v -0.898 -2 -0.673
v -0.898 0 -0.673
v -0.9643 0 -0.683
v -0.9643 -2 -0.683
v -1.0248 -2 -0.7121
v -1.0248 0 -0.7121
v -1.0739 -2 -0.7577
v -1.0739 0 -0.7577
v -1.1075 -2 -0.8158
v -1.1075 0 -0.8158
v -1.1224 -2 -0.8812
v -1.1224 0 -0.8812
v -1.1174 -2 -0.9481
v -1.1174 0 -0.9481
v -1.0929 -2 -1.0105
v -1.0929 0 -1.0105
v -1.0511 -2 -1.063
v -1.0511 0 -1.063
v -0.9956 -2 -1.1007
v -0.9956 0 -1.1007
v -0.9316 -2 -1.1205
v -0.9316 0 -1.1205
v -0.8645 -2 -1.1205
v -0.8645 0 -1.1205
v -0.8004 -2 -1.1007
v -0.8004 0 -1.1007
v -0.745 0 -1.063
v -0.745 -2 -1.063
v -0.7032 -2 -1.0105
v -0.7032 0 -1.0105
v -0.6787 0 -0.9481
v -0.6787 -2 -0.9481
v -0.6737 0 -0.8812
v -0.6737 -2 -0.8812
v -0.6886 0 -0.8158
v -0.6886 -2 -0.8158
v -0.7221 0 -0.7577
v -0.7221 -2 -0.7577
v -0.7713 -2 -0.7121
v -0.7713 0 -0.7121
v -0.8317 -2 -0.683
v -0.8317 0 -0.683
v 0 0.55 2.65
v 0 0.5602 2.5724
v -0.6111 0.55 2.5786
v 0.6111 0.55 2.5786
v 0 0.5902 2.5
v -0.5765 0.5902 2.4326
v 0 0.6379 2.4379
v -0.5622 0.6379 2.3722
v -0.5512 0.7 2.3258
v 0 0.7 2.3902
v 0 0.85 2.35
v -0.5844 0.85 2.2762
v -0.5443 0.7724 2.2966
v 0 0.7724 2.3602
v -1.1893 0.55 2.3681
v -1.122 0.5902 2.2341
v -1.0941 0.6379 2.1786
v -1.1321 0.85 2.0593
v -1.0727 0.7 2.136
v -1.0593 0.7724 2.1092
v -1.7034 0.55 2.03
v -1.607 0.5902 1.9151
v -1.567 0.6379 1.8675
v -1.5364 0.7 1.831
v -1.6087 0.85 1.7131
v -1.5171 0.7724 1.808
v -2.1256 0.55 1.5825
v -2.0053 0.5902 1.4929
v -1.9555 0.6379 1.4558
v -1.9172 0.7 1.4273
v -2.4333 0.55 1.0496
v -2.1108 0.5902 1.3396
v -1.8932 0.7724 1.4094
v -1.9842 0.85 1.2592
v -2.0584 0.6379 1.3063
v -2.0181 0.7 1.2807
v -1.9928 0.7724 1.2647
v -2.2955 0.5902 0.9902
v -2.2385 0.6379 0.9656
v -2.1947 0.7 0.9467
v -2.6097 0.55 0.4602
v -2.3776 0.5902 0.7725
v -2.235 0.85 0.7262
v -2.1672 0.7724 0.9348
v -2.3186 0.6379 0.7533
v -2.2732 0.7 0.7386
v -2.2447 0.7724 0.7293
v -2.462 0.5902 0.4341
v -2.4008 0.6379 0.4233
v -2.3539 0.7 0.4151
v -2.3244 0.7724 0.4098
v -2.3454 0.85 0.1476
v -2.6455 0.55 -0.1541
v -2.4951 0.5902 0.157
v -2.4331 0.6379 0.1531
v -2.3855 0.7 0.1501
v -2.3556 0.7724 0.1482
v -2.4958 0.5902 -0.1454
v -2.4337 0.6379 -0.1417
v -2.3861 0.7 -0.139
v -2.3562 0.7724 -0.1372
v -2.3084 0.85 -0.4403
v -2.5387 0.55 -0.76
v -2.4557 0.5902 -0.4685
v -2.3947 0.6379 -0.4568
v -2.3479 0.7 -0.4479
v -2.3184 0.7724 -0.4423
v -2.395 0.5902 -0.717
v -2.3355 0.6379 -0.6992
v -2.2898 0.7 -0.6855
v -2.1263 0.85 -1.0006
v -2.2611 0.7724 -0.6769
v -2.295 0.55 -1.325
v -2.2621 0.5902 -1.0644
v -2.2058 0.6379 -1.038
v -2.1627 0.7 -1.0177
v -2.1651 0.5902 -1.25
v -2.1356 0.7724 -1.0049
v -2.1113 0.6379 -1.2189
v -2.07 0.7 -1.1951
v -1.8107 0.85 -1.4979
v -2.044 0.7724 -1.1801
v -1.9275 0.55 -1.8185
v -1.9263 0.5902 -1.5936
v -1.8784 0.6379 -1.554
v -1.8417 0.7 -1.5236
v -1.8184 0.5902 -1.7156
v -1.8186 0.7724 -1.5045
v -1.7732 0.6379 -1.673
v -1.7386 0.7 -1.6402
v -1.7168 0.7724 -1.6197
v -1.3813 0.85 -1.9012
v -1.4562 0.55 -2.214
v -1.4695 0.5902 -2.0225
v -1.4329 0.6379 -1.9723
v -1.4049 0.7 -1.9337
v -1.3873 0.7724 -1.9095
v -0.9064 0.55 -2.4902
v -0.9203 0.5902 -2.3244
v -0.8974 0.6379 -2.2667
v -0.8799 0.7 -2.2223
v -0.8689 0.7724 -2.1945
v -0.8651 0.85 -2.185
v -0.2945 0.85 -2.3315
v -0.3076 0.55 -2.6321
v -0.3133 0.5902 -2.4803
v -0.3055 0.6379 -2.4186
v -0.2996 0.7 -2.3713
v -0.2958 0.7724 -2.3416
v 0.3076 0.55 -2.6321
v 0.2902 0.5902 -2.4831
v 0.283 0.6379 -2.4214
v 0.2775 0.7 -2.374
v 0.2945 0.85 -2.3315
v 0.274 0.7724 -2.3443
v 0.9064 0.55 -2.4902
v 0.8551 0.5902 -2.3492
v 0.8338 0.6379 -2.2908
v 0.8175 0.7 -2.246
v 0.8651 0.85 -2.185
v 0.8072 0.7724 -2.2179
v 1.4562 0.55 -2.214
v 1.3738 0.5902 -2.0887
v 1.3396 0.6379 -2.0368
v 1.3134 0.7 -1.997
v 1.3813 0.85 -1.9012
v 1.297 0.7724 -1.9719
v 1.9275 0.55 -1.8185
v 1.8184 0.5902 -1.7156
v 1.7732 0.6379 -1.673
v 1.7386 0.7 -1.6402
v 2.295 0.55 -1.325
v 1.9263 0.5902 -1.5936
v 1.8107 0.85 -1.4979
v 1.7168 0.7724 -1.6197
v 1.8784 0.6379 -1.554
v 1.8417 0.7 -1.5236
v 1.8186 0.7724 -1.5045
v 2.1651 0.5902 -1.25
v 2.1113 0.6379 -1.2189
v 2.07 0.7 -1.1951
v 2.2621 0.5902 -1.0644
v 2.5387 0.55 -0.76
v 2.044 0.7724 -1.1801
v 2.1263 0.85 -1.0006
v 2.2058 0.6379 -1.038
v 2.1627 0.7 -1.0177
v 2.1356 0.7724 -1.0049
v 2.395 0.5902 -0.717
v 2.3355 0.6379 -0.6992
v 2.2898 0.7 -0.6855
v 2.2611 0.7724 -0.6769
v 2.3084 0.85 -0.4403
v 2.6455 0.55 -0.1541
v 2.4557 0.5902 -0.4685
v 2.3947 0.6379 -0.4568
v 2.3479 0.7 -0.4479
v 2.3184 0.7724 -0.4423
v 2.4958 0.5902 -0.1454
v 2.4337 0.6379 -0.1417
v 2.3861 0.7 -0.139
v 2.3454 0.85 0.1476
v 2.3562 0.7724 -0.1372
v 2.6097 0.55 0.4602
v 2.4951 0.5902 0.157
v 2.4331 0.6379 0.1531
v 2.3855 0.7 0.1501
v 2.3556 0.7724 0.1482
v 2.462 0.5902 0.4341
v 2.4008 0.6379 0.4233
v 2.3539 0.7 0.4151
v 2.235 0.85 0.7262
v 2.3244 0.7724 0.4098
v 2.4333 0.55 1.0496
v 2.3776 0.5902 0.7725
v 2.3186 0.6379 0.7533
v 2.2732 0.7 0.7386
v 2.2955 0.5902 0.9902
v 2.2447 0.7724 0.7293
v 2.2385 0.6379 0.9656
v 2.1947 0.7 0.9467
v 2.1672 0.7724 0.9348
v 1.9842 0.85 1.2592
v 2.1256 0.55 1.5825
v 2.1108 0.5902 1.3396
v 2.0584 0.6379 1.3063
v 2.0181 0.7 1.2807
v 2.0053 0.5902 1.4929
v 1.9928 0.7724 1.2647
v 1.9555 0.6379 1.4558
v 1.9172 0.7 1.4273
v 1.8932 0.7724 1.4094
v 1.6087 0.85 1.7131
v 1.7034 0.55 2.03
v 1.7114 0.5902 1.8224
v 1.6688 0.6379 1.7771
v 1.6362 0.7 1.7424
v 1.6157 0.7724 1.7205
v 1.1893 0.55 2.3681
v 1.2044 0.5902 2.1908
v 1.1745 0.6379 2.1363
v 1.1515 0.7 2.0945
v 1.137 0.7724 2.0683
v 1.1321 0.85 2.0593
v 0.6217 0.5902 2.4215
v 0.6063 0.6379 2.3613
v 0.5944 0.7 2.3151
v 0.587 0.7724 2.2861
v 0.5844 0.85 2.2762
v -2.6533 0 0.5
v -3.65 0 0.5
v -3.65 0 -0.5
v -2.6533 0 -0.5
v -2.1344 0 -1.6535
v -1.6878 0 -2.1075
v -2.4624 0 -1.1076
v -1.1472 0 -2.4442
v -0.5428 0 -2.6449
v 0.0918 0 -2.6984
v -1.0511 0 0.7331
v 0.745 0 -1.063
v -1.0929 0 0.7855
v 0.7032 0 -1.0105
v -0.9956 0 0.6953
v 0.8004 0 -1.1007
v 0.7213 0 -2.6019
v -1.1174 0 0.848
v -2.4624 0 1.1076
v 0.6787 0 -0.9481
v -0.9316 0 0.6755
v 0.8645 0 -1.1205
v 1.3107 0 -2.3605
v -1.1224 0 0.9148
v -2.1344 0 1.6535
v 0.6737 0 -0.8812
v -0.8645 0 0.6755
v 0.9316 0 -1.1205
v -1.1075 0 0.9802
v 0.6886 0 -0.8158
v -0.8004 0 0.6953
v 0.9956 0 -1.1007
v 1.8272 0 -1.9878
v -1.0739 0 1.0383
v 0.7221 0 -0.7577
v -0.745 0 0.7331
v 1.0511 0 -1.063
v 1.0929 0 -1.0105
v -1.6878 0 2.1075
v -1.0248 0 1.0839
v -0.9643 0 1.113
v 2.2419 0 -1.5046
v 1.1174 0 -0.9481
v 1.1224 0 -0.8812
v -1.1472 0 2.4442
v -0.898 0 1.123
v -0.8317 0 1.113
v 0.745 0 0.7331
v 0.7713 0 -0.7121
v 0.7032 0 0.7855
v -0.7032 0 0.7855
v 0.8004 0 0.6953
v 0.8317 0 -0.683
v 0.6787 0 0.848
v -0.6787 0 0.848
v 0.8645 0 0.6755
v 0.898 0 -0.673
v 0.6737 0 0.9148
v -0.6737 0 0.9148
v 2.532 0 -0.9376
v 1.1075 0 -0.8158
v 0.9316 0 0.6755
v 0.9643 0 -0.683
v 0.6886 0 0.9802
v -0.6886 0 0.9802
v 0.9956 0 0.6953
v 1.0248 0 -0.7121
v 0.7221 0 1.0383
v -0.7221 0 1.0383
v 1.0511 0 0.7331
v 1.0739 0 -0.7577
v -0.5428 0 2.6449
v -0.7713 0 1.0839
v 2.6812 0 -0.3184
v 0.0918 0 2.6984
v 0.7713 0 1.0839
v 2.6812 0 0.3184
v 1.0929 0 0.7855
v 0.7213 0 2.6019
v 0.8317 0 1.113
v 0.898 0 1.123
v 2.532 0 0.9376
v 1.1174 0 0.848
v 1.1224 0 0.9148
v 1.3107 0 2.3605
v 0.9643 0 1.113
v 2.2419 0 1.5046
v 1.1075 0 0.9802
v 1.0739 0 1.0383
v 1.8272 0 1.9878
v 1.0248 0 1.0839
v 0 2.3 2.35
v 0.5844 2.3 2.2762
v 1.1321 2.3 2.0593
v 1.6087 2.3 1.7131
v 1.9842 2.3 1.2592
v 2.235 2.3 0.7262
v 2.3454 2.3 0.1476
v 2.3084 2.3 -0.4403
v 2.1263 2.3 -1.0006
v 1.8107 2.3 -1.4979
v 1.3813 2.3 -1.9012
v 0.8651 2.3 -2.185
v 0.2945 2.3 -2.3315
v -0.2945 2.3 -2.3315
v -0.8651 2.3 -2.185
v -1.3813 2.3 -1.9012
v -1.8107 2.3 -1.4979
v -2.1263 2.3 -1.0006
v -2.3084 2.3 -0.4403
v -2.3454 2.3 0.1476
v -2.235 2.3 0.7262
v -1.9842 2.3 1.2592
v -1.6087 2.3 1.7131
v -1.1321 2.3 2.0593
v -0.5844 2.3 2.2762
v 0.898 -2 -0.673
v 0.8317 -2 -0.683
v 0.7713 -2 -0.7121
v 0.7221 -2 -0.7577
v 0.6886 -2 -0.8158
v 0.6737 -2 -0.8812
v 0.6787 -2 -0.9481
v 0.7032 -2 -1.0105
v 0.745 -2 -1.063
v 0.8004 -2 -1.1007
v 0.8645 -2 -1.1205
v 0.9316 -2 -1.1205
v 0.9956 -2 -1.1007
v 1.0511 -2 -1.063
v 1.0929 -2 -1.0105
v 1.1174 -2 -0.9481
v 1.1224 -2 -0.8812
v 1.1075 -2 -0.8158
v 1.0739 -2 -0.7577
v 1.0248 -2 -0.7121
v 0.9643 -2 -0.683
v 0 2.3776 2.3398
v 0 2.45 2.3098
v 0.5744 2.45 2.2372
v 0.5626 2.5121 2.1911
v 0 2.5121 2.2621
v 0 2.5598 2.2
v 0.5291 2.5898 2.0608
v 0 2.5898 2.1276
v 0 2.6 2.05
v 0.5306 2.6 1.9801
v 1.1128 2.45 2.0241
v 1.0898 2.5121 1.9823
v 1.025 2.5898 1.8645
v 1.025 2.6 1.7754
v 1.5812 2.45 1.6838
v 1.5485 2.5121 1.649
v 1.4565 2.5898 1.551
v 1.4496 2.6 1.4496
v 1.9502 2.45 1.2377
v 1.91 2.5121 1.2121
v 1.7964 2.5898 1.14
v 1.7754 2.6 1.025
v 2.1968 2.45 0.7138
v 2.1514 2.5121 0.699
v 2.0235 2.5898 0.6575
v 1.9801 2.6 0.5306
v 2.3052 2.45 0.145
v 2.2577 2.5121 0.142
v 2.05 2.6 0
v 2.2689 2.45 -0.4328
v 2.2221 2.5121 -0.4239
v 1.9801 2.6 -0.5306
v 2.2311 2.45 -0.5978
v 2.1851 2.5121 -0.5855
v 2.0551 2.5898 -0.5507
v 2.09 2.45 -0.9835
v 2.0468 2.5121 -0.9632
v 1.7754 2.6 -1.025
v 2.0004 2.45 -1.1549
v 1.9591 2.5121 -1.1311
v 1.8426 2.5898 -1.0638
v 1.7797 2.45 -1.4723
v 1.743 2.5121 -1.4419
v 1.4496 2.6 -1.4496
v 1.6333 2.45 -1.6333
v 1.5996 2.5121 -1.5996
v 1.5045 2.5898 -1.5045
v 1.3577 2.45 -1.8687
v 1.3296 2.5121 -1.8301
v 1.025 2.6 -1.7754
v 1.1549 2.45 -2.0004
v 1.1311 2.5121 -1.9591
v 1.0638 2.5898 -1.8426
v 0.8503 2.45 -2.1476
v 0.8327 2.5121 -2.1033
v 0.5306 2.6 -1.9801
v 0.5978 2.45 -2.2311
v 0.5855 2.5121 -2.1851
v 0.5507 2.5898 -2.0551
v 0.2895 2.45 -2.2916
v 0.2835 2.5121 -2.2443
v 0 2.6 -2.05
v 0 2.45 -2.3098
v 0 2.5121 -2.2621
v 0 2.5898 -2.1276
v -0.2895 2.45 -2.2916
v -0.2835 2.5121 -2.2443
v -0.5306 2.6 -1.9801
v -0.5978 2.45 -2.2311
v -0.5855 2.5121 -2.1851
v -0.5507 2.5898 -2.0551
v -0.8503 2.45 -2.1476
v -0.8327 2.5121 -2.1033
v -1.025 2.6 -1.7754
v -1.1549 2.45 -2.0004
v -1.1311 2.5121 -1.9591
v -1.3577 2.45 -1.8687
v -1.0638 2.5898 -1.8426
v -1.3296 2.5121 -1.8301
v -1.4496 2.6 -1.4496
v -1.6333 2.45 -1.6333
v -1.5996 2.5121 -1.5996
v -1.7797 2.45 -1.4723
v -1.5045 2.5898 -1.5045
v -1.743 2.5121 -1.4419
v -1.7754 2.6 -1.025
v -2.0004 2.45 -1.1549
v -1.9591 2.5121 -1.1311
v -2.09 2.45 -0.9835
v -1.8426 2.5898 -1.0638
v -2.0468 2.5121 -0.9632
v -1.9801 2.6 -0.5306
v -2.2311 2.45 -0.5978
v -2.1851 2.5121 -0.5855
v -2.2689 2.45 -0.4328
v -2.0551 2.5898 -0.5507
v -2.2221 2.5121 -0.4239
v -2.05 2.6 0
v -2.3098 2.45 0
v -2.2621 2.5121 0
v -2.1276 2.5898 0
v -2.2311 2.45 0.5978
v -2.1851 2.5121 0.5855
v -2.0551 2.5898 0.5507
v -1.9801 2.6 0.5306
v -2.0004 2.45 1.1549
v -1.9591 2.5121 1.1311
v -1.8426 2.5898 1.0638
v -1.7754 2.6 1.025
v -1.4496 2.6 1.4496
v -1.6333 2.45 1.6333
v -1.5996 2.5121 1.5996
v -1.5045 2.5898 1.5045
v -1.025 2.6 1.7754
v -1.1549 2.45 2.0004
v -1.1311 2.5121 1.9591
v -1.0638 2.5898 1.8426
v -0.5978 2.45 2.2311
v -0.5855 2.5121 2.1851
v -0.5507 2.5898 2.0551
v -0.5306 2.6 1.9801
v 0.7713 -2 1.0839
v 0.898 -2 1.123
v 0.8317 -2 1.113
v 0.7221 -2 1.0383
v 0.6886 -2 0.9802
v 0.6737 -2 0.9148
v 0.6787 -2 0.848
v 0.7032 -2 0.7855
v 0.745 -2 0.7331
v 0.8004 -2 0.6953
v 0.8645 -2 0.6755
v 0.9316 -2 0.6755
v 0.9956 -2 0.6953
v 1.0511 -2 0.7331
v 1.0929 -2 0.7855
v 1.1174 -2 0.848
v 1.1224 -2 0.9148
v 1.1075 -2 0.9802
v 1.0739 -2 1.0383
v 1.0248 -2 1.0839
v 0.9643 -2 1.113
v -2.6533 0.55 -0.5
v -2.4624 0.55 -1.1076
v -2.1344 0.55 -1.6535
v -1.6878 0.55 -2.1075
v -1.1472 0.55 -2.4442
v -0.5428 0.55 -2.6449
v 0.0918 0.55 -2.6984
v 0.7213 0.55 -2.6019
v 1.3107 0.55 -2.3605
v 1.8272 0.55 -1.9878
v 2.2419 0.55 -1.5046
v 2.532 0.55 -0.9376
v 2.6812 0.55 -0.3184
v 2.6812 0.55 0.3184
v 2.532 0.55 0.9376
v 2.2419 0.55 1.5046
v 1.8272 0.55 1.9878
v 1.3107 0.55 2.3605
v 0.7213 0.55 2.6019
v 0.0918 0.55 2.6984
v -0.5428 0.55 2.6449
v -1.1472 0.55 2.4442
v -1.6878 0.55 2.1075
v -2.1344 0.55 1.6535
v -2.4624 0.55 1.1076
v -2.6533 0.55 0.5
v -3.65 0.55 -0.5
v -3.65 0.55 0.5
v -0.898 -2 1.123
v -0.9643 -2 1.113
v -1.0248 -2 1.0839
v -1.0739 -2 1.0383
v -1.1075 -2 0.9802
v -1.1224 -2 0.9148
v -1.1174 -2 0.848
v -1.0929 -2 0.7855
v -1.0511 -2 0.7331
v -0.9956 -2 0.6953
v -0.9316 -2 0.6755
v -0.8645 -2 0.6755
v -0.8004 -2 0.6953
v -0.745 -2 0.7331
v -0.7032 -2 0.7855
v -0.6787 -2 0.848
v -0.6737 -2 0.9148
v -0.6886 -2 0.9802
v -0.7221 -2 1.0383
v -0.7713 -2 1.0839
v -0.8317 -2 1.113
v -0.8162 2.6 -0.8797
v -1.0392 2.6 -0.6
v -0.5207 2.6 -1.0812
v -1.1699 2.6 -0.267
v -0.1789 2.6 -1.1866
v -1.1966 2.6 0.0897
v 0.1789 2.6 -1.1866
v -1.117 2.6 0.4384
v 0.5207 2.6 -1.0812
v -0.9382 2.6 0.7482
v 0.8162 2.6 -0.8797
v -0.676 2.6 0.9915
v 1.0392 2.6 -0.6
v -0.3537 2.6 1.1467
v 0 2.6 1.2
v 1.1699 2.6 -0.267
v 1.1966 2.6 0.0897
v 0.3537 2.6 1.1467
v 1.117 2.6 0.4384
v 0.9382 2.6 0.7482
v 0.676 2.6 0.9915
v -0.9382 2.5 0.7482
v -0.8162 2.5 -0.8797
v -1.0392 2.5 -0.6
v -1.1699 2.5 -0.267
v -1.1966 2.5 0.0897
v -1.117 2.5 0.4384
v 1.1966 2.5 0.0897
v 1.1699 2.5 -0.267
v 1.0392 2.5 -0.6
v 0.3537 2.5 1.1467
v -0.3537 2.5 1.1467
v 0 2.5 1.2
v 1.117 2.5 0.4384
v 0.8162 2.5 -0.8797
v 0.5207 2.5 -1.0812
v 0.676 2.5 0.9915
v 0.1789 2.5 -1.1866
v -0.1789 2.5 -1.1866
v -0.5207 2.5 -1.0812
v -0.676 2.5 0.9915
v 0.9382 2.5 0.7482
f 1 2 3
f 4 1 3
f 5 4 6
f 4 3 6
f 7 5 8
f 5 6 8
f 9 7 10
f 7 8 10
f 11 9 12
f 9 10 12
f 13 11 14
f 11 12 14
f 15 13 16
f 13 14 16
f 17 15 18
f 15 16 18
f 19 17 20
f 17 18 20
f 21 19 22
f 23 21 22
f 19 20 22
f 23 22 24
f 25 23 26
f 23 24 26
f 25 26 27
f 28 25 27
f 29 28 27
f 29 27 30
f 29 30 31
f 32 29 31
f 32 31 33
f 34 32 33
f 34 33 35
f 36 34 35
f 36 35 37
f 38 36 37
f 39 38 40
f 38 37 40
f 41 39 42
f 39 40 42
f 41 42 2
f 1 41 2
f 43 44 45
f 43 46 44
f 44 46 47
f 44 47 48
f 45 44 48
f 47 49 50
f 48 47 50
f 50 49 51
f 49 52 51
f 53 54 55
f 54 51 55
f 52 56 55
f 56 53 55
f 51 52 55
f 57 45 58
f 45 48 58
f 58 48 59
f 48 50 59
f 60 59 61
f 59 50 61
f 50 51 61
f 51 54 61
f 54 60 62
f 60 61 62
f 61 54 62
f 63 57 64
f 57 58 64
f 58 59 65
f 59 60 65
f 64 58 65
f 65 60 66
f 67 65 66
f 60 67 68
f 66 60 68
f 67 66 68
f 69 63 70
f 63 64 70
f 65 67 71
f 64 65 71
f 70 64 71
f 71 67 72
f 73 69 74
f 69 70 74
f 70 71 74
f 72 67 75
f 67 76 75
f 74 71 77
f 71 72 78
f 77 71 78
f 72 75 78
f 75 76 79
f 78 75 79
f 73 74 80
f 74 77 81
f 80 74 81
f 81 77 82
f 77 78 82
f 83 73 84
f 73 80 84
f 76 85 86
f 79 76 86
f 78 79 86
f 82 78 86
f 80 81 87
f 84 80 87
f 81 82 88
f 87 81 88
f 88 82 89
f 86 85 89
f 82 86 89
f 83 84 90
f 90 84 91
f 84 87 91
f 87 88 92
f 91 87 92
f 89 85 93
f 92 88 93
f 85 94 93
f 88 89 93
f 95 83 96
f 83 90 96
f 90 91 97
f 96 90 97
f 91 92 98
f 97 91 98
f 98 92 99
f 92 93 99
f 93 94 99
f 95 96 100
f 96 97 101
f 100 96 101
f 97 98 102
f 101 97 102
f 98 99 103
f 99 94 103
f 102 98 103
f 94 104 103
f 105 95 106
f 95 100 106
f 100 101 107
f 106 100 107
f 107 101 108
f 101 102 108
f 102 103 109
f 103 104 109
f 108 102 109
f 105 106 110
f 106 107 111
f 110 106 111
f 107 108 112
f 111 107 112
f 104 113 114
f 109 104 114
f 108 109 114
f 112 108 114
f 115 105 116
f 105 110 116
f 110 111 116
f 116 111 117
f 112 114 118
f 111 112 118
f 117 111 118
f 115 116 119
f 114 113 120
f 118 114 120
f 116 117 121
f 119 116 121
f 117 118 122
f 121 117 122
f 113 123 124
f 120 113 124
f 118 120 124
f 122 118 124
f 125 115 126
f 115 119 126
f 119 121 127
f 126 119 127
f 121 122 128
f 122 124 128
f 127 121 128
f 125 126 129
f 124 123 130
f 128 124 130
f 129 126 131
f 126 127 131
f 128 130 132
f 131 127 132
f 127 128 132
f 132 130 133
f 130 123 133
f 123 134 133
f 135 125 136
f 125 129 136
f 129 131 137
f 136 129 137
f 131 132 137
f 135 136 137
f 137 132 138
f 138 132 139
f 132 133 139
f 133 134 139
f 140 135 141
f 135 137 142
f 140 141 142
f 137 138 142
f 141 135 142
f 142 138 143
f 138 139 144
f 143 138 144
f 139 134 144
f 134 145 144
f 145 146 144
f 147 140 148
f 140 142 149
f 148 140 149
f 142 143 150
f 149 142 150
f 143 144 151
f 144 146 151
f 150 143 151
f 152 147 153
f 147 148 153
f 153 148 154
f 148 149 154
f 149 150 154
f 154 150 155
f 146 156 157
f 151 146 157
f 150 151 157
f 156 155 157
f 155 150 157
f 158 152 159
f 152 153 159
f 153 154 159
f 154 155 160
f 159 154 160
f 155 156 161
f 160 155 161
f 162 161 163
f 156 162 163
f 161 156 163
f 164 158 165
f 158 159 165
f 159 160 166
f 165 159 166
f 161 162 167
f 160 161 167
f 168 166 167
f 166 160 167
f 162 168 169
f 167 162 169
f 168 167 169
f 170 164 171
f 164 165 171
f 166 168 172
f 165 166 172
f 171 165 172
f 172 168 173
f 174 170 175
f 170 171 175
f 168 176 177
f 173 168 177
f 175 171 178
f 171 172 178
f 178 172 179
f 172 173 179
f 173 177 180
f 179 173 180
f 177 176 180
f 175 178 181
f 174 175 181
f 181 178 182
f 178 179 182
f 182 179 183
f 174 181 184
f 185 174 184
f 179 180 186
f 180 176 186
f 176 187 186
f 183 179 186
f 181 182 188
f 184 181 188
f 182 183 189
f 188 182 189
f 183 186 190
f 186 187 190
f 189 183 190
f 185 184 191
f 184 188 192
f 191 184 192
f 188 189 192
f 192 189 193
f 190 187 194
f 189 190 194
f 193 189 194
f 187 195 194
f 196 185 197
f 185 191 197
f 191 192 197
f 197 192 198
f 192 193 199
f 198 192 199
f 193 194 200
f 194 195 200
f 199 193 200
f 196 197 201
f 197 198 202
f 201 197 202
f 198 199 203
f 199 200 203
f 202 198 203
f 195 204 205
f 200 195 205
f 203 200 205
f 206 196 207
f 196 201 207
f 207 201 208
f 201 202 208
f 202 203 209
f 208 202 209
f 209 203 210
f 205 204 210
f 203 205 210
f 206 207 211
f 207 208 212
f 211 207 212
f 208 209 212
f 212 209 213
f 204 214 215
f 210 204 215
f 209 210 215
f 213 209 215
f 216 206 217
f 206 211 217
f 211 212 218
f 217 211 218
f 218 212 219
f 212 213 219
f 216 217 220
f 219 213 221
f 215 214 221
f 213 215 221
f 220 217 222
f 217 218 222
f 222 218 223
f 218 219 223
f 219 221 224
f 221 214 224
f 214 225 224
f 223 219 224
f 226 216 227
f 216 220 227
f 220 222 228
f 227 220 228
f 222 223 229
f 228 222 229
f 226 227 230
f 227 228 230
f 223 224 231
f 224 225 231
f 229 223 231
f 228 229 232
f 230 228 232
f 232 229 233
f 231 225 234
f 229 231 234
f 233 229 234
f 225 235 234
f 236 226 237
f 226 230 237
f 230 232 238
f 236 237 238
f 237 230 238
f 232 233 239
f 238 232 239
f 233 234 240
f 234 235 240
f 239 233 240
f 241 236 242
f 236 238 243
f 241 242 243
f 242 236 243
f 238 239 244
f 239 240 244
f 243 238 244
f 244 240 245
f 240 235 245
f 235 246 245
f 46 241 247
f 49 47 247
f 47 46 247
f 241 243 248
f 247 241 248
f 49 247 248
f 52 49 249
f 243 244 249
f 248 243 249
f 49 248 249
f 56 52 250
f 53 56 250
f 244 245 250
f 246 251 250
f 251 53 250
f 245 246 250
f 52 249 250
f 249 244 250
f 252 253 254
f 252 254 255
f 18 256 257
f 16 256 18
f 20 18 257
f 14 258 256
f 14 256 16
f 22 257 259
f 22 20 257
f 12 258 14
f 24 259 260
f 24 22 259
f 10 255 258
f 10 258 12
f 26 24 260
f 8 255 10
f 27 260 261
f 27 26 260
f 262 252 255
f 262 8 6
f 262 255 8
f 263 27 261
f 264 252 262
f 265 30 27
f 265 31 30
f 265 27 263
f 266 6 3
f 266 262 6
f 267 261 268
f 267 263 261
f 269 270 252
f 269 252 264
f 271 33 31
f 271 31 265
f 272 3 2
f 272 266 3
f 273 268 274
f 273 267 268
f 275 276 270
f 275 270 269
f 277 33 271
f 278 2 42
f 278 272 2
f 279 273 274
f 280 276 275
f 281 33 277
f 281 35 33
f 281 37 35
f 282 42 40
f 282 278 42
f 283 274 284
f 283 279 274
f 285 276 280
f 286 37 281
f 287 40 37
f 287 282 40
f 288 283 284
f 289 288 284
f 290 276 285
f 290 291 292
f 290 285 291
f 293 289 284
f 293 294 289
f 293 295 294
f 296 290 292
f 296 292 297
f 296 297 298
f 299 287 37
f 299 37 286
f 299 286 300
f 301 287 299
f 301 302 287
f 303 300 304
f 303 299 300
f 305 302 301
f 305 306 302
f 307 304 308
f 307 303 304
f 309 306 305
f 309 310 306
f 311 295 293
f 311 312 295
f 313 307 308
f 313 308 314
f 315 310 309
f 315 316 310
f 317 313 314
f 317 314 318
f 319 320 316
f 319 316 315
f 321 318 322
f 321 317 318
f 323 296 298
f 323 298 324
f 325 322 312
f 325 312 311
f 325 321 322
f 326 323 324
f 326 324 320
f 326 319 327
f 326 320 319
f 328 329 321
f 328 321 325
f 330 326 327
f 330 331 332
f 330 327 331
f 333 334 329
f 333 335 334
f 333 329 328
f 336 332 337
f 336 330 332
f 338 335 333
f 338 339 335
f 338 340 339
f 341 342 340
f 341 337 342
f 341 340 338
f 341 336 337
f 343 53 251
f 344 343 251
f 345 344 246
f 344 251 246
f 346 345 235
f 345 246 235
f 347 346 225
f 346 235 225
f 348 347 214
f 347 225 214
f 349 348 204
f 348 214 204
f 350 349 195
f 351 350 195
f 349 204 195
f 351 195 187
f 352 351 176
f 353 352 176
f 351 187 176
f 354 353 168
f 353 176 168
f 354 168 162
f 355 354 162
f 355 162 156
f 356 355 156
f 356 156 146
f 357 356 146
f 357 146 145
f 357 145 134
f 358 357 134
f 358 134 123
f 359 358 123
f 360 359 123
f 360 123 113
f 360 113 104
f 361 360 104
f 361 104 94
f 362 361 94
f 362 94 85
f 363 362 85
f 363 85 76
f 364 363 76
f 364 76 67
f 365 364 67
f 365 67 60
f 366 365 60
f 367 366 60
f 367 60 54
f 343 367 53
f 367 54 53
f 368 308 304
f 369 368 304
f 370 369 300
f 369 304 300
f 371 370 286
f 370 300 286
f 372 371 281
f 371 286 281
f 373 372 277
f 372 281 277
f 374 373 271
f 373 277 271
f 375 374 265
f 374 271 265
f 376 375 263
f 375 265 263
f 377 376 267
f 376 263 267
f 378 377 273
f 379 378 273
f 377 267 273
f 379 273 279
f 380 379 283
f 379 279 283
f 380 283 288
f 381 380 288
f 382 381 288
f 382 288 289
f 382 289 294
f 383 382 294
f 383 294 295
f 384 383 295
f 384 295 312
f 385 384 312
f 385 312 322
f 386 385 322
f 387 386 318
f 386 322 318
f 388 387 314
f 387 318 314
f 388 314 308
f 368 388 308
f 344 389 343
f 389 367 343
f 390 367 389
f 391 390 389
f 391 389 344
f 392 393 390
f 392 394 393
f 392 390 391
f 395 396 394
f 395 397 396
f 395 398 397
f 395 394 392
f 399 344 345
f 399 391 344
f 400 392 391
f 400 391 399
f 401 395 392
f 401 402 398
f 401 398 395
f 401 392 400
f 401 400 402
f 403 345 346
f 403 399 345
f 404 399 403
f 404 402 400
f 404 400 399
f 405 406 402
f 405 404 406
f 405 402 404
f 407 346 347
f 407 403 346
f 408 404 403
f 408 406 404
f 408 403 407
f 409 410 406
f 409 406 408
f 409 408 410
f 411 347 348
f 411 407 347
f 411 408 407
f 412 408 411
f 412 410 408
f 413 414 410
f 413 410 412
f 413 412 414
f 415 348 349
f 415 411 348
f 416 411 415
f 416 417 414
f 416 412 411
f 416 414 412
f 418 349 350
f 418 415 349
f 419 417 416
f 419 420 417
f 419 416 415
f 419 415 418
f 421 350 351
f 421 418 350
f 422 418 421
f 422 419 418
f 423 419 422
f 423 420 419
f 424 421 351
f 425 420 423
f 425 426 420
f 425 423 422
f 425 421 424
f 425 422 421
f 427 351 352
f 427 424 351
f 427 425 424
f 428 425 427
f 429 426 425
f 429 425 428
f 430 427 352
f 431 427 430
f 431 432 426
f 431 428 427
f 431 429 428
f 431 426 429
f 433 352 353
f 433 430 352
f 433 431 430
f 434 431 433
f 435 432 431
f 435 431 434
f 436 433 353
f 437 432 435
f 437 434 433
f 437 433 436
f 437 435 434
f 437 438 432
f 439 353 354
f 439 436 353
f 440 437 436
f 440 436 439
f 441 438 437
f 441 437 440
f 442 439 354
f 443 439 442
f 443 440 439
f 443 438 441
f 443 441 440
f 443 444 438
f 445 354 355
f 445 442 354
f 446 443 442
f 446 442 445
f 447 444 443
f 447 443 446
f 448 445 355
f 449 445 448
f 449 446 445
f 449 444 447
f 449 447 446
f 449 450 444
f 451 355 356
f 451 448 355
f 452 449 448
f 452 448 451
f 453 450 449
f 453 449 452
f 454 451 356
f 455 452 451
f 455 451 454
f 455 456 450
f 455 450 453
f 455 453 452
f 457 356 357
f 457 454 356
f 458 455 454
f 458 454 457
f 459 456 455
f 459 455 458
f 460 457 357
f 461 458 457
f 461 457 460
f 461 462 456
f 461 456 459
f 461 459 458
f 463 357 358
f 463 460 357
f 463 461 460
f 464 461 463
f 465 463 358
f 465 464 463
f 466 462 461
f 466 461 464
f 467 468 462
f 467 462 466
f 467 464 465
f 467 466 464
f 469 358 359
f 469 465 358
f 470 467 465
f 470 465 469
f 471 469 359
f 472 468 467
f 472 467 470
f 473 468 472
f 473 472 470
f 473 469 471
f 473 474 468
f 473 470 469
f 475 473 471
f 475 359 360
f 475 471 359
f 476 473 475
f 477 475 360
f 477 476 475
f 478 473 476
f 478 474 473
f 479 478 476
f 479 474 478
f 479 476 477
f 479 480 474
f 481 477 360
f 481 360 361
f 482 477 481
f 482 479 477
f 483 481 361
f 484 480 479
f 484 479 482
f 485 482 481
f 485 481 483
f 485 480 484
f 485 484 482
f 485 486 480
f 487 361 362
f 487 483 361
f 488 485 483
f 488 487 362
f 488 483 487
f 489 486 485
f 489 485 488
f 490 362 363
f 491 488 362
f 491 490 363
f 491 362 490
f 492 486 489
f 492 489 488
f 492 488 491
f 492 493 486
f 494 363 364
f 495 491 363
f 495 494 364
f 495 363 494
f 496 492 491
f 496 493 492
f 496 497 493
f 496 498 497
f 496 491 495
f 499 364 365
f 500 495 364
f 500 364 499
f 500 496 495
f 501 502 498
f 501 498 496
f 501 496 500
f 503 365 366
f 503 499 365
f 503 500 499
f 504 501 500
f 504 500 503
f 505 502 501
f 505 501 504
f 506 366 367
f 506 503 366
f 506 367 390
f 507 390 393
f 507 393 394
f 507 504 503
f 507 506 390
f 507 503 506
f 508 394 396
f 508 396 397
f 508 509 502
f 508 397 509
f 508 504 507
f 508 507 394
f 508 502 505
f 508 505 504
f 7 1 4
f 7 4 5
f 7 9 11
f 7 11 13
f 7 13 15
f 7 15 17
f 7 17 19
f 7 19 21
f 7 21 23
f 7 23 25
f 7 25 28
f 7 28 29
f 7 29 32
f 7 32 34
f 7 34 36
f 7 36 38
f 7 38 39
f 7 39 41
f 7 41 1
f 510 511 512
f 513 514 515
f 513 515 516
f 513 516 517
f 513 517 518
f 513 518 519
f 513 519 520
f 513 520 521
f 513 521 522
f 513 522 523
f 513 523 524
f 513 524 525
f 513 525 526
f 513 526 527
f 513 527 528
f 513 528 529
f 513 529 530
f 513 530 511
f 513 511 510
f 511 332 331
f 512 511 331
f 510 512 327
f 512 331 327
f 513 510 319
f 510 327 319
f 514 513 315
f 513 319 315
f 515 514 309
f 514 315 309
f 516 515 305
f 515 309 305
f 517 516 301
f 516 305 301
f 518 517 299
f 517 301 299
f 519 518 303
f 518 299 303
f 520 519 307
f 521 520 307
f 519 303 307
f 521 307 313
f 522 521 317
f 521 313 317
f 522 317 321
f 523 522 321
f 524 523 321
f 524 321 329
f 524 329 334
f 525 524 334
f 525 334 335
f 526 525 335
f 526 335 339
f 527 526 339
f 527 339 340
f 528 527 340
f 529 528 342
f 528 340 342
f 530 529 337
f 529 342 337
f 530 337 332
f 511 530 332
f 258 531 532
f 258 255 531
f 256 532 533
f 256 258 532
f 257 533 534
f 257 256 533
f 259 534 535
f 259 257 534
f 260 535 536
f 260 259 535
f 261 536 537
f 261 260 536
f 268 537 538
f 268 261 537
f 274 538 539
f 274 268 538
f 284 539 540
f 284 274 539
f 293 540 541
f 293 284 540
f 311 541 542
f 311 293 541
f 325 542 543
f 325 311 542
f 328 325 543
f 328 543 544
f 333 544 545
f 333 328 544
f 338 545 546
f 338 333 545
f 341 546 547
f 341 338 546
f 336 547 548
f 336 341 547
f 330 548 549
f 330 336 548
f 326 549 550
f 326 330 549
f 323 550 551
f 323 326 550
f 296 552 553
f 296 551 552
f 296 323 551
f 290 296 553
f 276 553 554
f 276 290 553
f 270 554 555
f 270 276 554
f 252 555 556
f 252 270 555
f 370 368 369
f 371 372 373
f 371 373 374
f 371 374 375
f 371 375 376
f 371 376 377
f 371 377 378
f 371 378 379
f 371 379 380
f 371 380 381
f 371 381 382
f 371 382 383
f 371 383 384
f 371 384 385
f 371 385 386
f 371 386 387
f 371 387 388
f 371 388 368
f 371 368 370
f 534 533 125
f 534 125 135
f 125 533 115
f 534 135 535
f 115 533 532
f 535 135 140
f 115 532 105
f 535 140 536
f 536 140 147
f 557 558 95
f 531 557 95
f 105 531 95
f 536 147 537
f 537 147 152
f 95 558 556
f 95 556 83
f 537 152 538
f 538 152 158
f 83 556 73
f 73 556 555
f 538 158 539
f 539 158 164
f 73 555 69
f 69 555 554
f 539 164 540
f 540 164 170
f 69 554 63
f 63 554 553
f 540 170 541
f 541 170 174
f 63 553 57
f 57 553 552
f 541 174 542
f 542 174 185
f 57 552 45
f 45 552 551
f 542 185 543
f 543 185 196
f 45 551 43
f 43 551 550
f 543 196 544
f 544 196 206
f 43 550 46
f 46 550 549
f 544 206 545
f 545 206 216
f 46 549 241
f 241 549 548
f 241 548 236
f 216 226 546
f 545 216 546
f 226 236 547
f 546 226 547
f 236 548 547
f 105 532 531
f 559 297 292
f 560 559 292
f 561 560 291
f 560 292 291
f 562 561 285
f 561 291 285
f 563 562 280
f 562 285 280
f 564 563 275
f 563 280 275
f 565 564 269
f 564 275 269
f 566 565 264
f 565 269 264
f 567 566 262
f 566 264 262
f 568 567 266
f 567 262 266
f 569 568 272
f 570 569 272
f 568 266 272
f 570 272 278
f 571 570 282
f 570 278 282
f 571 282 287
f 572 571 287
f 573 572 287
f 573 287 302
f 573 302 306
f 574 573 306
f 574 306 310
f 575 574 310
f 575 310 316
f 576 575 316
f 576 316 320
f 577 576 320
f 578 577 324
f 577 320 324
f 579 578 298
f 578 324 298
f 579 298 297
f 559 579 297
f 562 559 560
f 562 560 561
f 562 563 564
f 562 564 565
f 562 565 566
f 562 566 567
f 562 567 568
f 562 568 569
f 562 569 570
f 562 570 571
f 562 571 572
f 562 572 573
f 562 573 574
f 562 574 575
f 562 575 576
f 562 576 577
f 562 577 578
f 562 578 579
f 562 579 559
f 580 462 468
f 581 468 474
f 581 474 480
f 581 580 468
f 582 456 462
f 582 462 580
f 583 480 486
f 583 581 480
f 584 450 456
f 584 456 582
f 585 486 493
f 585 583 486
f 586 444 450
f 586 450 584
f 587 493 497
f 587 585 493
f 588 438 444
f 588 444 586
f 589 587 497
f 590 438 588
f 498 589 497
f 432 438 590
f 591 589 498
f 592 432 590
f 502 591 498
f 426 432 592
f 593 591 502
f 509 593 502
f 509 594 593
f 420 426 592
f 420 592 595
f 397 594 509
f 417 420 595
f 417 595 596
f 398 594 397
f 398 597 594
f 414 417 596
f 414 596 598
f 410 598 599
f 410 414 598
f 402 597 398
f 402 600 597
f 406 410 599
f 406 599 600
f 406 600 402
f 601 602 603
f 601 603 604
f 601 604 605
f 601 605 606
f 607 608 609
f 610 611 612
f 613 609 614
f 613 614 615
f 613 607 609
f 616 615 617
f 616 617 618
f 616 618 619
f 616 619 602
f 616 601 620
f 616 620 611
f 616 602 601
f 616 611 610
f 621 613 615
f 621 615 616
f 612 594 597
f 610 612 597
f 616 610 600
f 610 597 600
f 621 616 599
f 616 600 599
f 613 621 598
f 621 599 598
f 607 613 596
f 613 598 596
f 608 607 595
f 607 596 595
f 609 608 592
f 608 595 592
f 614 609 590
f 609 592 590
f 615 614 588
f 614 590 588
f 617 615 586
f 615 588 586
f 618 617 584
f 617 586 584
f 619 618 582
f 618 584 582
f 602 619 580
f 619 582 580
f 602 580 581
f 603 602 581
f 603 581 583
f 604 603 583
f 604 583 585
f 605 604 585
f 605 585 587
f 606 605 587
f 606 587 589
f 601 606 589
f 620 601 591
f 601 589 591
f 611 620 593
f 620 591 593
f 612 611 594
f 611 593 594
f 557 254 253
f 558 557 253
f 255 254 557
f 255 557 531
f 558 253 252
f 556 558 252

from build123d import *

# Parameters (mm, degrees)
SKETCH1_R           = 2.35
BOSS_EXTRUDE1_DEPTH = 2.6
SKETCH2_R           = 2.7
BOSS_EXTRUDE2_DEPTH = 0.55
FILLET1_R           = 0.3
FILLET2_R           = 0.3
SKETCH3_R           = 1.2
CUT_EXTRUDE1_DEPTH  = 0.1
SKETCH4_W           = 1.15
SKETCH4_H           = 1
BOSS_EXTRUDE3_DEPTH = 0.55
SKETCH5_R           = 0.225
BOSS_EXTRUDE4_DEPTH = 2


with BuildPart() as part:
    # Sketch1 → Boss-Extrude1 (new body)
    with BuildSketch(Plane(origin=(0, 0, 0), x_dir=(1, 0, 0), z_dir=(0, 1, 0))):
        with Locations(Location((0, 0, 0), (0, 0, 270))):
            Circle(SKETCH1_R)
    extrude(amount=BOSS_EXTRUDE1_DEPTH)

    # Sketch2 → Boss-Extrude2 (add)
    with BuildSketch(Plane.XZ):
        with Locations(Location((0, 0, 0), (0, 0, 270))):
            Circle(SKETCH2_R)
    extrude(amount=-BOSS_EXTRUDE2_DEPTH)

    # Fillet1
    fillet1_edges = [part.edges().sort_by_distance(p)[0] for p in [
        (0, 0.55, -2.35),
    ]]
    fillet(fillet1_edges, radius=FILLET1_R)

    # Fillet2
    fillet2_edges = [part.edges().sort_by_distance(p)[0] for p in [
        (0, 2.6, -2.35),
    ]]
    fillet(fillet2_edges, radius=FILLET2_R)

    # Sketch3 → Cut-Extrude1 (cut)
    with BuildSketch(Plane(origin=(0, 2.6, 0), x_dir=(1, 0, 0), z_dir=(0, 1, 0))):
        with Locations(Location((0, 0, 0), (0, 0, 270))):
            Circle(SKETCH3_R)
    extrude(amount=-CUT_EXTRUDE1_DEPTH, mode=Mode.SUBTRACT)

    # Sketch4 → Boss-Extrude3 (add)
    with BuildSketch(Plane.XZ):
        with Locations((-3.075, 0)):
            Rectangle(SKETCH4_W, SKETCH4_H)
    extrude(amount=-BOSS_EXTRUDE3_DEPTH)

    # Sketch5 → Boss-Extrude4 (add)
    with BuildSketch(Plane.XZ):
        with Locations(Location((-0.898025612, 0.898025612, 0), (0, 0, 90))):
            Circle(SKETCH5_R)
        with Locations(Location((0.898025612, 0.898025612, 0), (0, 0, 90))):
            Circle(SKETCH5_R)
        with Locations(Location((-0.898025612, -0.898025612, 0), (0, 0, 90))):
            Circle(SKETCH5_R)
        with Locations(Location((0.898025612, -0.898025612, 0), (0, 0, 90))):
            Circle(SKETCH5_R)
    extrude(amount=BOSS_EXTRUDE4_DEPTH)


solid = part.part
